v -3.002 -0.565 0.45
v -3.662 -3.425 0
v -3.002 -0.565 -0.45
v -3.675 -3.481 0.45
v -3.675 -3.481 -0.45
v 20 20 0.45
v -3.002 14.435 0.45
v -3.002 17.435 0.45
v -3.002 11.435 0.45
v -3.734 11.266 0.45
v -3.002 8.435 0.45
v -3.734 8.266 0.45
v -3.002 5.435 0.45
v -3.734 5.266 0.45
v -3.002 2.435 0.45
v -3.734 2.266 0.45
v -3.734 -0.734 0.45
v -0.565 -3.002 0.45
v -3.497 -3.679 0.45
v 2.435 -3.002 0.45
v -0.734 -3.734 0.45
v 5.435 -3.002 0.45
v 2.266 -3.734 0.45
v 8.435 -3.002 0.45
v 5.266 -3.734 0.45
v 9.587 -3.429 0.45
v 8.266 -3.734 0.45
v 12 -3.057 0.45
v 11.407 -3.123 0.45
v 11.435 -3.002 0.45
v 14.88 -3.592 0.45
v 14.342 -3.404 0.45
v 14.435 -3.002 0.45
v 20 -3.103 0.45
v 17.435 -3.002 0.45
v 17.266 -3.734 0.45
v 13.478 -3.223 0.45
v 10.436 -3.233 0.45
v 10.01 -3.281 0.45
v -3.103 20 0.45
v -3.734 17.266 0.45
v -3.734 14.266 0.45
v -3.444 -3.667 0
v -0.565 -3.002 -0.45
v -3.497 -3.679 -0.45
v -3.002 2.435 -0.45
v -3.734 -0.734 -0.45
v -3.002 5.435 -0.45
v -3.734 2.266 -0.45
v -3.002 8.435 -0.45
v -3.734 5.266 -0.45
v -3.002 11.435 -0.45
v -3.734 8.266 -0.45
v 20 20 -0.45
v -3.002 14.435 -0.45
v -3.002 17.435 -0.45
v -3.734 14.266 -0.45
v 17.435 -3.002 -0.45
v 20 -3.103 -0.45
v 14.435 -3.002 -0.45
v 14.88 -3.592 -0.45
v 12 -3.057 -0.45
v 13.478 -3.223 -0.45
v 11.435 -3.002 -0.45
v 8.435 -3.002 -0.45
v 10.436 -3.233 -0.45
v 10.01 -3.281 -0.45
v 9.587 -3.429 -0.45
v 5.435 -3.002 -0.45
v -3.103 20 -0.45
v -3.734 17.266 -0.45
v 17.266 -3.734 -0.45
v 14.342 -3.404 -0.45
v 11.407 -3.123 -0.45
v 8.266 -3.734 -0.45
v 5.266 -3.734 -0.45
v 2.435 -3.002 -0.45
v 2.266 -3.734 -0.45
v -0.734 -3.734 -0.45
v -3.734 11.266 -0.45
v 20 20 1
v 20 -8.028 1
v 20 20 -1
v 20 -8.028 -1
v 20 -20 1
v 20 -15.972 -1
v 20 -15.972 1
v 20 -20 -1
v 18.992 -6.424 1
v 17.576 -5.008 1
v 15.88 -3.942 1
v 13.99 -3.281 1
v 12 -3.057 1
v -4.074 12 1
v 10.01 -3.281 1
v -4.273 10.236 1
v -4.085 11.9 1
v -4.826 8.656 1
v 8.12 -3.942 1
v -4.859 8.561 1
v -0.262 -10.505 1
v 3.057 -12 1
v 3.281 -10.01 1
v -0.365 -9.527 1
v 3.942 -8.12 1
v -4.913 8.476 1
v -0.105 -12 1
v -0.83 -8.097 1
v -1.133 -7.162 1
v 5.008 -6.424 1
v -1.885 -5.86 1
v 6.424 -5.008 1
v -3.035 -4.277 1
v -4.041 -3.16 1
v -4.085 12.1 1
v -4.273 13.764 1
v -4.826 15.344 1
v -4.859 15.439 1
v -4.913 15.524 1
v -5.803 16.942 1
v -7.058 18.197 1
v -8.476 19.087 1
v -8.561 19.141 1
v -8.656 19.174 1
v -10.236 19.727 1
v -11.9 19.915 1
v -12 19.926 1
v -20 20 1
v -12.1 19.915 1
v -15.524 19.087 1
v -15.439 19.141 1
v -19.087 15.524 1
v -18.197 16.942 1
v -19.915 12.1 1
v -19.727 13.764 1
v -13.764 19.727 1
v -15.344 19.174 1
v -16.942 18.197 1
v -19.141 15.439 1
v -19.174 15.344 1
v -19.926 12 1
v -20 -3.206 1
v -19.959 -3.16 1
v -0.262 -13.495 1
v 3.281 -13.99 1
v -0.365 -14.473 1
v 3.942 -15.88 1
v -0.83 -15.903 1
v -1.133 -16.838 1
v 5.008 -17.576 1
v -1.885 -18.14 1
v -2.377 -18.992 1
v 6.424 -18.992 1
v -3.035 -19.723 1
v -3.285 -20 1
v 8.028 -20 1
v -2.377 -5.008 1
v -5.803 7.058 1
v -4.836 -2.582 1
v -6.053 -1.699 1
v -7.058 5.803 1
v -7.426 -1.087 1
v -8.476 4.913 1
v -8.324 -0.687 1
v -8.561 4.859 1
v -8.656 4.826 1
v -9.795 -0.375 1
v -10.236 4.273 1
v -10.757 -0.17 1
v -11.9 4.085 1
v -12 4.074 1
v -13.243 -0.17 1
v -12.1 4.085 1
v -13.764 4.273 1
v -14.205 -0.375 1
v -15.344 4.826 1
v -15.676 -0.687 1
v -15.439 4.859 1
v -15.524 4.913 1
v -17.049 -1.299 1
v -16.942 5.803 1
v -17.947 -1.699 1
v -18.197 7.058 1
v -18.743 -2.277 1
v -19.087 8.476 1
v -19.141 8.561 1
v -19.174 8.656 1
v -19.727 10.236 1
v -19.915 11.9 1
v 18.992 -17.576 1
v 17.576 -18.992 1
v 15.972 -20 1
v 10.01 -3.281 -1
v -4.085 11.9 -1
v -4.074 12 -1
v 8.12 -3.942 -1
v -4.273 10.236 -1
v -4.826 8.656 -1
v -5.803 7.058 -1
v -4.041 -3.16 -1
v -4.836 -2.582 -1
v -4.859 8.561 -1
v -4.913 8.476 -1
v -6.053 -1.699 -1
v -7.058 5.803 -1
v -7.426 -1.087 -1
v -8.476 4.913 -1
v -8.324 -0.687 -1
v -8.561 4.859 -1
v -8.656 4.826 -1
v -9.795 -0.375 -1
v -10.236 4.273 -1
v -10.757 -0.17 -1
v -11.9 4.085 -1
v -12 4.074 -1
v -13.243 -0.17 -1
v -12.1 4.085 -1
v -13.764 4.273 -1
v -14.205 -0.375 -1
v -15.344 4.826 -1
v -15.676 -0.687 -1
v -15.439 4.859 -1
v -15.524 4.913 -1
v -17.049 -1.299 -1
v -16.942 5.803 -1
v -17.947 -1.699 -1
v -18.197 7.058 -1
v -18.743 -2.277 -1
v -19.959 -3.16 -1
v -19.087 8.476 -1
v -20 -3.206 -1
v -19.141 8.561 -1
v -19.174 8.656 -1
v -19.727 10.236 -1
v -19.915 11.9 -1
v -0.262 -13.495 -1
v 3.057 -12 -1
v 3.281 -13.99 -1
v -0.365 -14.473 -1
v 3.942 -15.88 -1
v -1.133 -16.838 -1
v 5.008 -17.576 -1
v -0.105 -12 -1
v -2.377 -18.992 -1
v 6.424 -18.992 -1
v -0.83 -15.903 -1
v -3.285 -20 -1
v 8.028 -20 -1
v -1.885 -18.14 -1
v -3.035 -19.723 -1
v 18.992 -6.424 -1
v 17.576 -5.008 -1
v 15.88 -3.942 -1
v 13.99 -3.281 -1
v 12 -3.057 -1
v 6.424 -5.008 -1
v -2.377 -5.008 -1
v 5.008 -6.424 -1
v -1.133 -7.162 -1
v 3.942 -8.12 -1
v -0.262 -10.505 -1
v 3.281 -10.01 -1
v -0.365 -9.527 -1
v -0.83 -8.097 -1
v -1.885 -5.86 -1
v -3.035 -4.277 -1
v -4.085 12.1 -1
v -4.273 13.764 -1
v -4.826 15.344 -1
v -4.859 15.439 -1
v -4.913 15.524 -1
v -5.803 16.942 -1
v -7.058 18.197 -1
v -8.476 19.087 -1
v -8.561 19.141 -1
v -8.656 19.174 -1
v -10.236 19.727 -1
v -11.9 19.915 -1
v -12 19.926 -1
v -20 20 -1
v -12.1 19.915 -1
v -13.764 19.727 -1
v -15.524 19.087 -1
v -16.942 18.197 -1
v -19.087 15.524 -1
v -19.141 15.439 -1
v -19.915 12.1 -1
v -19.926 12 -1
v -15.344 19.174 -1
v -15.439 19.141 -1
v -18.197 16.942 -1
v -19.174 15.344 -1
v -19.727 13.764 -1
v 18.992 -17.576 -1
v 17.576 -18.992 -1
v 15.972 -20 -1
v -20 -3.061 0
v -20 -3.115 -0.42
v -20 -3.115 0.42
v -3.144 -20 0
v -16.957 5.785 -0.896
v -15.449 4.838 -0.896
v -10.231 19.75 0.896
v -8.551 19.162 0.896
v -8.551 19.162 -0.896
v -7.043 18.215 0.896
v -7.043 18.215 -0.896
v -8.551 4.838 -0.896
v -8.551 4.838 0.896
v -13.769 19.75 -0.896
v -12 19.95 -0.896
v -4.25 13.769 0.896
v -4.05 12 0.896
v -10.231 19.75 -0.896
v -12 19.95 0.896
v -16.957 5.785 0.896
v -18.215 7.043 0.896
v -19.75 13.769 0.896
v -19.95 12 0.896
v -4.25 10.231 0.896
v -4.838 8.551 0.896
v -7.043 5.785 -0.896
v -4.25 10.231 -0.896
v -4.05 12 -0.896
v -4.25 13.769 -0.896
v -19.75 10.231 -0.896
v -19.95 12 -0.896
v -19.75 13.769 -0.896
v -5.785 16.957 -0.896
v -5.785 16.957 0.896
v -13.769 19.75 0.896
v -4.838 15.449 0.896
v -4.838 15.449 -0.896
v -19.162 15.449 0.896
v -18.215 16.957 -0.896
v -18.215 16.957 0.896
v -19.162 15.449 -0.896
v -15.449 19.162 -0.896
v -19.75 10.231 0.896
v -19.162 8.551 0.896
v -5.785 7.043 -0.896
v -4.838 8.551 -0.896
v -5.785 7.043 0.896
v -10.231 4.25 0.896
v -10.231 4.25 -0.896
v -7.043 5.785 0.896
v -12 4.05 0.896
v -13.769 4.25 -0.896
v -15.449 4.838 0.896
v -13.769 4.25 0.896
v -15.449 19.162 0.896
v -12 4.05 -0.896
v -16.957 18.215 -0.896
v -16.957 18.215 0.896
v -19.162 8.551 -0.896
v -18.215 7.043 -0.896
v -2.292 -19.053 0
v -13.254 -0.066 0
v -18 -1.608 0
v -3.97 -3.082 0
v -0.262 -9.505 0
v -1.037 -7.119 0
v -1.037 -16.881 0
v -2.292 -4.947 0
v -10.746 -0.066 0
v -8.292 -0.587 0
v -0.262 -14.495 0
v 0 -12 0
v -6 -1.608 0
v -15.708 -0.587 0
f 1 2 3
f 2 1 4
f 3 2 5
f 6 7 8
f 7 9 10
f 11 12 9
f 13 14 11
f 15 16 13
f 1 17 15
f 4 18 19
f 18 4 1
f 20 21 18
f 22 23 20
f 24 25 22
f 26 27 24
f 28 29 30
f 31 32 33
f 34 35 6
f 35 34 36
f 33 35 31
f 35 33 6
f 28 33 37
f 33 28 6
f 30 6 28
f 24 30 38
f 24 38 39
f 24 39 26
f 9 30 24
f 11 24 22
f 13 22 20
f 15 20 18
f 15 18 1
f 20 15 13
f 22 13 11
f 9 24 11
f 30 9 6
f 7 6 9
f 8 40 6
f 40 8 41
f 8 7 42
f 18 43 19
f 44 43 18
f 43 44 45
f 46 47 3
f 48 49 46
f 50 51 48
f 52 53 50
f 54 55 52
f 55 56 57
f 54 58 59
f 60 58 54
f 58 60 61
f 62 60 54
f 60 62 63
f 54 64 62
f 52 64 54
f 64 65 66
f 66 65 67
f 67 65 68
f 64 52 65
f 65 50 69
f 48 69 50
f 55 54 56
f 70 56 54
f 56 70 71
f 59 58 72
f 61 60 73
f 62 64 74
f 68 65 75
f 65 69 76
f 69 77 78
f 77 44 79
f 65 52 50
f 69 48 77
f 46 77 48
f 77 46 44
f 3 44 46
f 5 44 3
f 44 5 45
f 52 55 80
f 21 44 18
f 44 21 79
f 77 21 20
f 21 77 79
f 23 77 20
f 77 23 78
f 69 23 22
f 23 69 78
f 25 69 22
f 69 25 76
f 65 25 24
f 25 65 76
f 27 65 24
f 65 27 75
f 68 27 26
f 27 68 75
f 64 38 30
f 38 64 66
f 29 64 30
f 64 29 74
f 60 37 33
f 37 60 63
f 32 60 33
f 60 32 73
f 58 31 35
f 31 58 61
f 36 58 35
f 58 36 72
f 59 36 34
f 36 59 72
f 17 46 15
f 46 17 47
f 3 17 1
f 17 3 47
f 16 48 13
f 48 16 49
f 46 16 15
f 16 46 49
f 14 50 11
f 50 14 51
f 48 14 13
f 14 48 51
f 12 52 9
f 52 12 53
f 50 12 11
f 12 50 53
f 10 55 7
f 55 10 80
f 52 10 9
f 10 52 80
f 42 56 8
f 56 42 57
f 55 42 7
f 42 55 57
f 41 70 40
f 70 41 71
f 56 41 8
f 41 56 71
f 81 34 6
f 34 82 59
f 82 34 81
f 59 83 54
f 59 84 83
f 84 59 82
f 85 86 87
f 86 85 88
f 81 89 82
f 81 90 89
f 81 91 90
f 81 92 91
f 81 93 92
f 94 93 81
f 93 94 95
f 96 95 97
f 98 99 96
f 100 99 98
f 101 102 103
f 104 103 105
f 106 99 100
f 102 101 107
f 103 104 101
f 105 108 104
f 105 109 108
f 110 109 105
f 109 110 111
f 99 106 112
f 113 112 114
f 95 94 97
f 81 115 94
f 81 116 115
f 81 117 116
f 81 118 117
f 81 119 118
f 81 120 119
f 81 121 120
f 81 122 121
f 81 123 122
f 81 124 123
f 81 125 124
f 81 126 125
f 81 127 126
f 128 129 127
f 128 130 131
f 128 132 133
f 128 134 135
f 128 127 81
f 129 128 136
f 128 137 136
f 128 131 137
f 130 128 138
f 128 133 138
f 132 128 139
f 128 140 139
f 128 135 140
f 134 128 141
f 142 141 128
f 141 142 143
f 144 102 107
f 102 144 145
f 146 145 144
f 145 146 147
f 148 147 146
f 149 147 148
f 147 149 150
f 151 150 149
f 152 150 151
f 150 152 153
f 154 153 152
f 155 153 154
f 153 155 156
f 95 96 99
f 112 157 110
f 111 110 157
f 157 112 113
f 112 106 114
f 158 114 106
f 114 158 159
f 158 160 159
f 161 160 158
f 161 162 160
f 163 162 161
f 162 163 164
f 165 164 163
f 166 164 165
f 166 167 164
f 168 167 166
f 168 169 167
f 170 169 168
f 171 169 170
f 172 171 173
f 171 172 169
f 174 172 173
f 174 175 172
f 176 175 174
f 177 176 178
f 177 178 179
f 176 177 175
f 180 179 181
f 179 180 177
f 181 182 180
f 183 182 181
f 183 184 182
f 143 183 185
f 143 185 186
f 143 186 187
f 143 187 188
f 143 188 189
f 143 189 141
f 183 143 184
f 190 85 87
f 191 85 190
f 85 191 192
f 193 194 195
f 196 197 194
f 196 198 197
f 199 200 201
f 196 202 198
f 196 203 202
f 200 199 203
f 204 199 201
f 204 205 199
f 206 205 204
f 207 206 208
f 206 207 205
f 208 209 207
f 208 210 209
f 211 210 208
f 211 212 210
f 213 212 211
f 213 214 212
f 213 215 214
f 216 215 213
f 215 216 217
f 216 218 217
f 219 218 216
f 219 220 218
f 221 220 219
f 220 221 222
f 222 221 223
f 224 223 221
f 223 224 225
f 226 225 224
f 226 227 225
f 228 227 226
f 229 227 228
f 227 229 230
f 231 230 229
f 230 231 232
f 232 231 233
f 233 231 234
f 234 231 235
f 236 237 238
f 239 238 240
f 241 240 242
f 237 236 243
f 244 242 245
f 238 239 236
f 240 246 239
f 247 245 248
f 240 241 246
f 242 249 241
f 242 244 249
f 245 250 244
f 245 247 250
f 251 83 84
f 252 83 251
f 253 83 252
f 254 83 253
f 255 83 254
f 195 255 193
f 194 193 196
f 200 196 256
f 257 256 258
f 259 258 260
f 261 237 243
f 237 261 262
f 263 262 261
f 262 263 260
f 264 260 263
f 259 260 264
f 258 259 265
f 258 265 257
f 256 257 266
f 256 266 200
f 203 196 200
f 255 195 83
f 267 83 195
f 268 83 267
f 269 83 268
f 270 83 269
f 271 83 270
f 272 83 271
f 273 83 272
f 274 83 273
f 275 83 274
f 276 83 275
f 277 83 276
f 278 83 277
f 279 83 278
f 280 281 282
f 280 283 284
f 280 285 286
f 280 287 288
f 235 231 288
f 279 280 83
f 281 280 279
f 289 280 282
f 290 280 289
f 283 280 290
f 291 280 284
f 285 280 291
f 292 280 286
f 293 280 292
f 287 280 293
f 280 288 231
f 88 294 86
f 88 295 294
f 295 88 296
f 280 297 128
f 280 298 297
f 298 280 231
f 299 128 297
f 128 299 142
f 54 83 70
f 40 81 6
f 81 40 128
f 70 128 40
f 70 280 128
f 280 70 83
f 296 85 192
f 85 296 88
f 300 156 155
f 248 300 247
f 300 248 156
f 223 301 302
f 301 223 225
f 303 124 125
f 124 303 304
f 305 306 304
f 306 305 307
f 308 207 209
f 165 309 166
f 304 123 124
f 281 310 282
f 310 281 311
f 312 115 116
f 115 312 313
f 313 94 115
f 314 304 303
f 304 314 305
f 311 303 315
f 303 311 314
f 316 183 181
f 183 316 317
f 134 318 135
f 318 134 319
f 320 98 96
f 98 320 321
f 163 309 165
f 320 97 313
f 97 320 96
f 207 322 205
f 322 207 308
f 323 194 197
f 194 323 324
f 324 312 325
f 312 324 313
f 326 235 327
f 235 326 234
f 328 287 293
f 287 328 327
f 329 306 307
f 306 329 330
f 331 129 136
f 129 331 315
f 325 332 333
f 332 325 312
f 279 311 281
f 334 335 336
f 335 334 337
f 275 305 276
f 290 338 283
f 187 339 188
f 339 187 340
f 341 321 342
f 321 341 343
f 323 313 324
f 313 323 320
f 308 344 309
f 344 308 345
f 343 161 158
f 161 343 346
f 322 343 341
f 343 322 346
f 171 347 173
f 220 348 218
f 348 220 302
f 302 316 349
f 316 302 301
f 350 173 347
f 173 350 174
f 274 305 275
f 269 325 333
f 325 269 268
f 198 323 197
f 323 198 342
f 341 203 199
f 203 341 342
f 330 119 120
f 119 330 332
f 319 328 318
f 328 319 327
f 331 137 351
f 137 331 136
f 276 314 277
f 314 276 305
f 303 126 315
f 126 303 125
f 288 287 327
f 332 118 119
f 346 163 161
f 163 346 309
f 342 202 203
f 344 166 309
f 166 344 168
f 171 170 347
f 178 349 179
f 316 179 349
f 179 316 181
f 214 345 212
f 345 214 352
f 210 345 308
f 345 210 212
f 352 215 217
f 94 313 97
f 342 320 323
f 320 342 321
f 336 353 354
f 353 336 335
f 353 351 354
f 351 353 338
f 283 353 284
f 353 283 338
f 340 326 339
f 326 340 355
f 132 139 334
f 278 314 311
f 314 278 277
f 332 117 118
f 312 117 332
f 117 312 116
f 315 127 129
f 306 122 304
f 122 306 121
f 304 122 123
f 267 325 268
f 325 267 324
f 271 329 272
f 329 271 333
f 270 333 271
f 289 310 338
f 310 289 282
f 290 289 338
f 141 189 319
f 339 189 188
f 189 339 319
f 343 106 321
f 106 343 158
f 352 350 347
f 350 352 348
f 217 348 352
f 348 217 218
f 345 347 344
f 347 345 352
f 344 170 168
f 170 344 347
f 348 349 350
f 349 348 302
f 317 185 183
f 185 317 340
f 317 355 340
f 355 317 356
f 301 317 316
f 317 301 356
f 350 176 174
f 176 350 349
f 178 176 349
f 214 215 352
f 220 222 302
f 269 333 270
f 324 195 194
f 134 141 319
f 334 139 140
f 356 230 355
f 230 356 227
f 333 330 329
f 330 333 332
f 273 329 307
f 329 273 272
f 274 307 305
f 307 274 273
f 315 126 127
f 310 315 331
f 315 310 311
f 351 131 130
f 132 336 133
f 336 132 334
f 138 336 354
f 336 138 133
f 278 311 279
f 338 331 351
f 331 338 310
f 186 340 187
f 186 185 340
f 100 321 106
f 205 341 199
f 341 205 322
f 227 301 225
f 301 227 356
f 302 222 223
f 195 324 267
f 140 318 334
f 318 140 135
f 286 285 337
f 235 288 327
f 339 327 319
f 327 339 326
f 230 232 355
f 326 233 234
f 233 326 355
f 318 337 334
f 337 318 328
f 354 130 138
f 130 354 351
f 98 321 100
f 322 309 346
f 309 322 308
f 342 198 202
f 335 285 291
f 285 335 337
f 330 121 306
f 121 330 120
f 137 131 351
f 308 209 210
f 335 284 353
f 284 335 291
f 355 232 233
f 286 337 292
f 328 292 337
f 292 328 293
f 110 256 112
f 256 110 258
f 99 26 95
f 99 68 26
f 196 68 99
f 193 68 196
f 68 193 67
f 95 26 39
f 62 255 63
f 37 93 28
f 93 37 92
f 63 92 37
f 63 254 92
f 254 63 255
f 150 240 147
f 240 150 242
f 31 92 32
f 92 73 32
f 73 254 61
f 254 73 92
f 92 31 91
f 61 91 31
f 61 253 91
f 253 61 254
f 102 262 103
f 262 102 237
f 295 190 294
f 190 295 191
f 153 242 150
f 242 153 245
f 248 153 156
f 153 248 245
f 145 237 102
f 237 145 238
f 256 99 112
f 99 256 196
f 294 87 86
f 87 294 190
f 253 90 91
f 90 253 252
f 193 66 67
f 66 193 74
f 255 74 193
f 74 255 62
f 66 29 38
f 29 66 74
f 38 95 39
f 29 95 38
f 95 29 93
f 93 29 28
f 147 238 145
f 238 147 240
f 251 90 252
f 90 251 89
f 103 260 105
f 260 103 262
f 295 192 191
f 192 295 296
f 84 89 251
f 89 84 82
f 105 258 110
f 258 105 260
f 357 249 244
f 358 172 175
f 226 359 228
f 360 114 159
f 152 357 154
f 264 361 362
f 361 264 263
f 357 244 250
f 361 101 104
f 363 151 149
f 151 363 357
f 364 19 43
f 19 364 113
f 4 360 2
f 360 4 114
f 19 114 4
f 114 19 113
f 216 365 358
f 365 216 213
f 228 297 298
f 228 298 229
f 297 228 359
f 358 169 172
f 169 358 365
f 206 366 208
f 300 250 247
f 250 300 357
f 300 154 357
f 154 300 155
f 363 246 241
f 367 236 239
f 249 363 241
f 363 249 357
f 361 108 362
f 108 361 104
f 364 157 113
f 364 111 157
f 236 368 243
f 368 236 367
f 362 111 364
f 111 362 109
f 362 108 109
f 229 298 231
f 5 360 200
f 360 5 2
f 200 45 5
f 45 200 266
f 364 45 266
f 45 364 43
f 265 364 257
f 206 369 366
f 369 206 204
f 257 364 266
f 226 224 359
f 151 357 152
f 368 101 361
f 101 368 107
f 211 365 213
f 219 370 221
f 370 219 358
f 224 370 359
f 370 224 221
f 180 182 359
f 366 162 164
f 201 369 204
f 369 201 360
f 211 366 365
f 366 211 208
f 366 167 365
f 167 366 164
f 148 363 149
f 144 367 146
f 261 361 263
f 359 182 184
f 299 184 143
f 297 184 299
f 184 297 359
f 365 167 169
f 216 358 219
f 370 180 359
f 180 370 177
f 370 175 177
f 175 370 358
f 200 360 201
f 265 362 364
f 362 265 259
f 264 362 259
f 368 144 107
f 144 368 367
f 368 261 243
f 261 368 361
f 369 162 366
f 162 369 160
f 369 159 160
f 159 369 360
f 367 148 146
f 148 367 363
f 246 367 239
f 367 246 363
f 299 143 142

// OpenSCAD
/*
 * texture_test_coupon.scad
 * Flat coupon with hill, valley, deep valley, and diamond texture for inspection.
 */

diamond_length = 8;
diamond_width = 5;
diamond_spacing = 2;

module diamond_pattern() {
    for (y = [-12:3:12]) {
        for (x = [-12:3:12]) {
            translate([x, y, 0])
                rotate([0,0,45])
                    scale([diamond_length * 0.6, diamond_width * 0.6, 1])
                        cylinder(h = 0.9, r = 1.1, $fn = 4, center = true);
        }
    }
}

module hill() {
    translate([-12, 12, 0])
        sphere(r = 8, $fn = 28);
}

module valley() {
    translate([12, -12, 0])
        sphere(r = 9, $fn = 28);
}

module deep_valley() {
    translate([-12, -12, 0])
        sphere(r = 12, $fn = 30);
}

difference() {
    cube([40,40,2], center=true);
    hill();
    valley();
    deep_valley();
    translate([12, 12, 0]) diamond_pattern();
}
